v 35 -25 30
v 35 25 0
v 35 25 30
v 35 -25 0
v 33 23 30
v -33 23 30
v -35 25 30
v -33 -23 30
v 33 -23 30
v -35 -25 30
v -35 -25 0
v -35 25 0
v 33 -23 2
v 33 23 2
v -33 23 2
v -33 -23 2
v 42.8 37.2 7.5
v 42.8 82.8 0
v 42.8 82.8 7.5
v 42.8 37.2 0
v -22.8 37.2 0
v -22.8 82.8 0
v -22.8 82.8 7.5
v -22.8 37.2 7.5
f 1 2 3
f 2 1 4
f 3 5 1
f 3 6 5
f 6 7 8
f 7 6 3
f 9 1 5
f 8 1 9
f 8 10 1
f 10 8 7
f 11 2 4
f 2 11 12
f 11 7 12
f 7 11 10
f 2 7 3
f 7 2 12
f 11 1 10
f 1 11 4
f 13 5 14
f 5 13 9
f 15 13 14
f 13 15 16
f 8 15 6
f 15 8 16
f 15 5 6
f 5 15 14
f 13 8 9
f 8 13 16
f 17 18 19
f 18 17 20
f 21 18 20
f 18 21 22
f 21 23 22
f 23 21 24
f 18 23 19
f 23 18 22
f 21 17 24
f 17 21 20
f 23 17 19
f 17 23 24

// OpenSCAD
// Two-part enclosure for small electronics board
// Print orientation: box standing on bed, lid upside down (plate on bed)

$fn = 64;

// ---- Box ----
box_x = 70;      // outer length (X)
box_y = 50;      // outer width (Y)
box_z = 30;      // outer height (Z)
wall = 2;        // wall thickness
floor = 2;       // floor thickness

// ---- Lid ----
lip_w = 65.6;    // lip outer length (X)
lip_d = 45.6;    // lip outer width (Y)
lip_h = 4;       // lip height (wall thickness)
lip_t = 1.5;     // lip top thickness

// ---- Misc ----
eps = 0.5;       // cutter overshoot
gap = 10;        // gap between parts on bed

// Derived
inner_x = box_x - 2*wall;
inner_y = box_y - 2*wall;
lip_total_h = lip_h + lip_t;   // lip top at z = floor + lip_total_h

module box() {
    difference() {
        translate([-box_x/2, -box_y/2, 0])
            cube([box_x, box_y, box_z]);
        // open-top cavity
        translate([-inner_x/2, -inner_y/2, floor])
            cube([inner_x, inner_y, box_z - floor + eps]);
    }
}

module lid() {
    translate([gap - lip_w/2, -lip_d/2, 0])
        union() {
            // plate
            cube([lip_w, lip_d, 2]);
            // lip
            translate([0, 0, 2])
                cube([lip_w, lip_d, lip_total_h]);
        }
}

box();
translate([0, box_y + gap, 0])
    lid();
